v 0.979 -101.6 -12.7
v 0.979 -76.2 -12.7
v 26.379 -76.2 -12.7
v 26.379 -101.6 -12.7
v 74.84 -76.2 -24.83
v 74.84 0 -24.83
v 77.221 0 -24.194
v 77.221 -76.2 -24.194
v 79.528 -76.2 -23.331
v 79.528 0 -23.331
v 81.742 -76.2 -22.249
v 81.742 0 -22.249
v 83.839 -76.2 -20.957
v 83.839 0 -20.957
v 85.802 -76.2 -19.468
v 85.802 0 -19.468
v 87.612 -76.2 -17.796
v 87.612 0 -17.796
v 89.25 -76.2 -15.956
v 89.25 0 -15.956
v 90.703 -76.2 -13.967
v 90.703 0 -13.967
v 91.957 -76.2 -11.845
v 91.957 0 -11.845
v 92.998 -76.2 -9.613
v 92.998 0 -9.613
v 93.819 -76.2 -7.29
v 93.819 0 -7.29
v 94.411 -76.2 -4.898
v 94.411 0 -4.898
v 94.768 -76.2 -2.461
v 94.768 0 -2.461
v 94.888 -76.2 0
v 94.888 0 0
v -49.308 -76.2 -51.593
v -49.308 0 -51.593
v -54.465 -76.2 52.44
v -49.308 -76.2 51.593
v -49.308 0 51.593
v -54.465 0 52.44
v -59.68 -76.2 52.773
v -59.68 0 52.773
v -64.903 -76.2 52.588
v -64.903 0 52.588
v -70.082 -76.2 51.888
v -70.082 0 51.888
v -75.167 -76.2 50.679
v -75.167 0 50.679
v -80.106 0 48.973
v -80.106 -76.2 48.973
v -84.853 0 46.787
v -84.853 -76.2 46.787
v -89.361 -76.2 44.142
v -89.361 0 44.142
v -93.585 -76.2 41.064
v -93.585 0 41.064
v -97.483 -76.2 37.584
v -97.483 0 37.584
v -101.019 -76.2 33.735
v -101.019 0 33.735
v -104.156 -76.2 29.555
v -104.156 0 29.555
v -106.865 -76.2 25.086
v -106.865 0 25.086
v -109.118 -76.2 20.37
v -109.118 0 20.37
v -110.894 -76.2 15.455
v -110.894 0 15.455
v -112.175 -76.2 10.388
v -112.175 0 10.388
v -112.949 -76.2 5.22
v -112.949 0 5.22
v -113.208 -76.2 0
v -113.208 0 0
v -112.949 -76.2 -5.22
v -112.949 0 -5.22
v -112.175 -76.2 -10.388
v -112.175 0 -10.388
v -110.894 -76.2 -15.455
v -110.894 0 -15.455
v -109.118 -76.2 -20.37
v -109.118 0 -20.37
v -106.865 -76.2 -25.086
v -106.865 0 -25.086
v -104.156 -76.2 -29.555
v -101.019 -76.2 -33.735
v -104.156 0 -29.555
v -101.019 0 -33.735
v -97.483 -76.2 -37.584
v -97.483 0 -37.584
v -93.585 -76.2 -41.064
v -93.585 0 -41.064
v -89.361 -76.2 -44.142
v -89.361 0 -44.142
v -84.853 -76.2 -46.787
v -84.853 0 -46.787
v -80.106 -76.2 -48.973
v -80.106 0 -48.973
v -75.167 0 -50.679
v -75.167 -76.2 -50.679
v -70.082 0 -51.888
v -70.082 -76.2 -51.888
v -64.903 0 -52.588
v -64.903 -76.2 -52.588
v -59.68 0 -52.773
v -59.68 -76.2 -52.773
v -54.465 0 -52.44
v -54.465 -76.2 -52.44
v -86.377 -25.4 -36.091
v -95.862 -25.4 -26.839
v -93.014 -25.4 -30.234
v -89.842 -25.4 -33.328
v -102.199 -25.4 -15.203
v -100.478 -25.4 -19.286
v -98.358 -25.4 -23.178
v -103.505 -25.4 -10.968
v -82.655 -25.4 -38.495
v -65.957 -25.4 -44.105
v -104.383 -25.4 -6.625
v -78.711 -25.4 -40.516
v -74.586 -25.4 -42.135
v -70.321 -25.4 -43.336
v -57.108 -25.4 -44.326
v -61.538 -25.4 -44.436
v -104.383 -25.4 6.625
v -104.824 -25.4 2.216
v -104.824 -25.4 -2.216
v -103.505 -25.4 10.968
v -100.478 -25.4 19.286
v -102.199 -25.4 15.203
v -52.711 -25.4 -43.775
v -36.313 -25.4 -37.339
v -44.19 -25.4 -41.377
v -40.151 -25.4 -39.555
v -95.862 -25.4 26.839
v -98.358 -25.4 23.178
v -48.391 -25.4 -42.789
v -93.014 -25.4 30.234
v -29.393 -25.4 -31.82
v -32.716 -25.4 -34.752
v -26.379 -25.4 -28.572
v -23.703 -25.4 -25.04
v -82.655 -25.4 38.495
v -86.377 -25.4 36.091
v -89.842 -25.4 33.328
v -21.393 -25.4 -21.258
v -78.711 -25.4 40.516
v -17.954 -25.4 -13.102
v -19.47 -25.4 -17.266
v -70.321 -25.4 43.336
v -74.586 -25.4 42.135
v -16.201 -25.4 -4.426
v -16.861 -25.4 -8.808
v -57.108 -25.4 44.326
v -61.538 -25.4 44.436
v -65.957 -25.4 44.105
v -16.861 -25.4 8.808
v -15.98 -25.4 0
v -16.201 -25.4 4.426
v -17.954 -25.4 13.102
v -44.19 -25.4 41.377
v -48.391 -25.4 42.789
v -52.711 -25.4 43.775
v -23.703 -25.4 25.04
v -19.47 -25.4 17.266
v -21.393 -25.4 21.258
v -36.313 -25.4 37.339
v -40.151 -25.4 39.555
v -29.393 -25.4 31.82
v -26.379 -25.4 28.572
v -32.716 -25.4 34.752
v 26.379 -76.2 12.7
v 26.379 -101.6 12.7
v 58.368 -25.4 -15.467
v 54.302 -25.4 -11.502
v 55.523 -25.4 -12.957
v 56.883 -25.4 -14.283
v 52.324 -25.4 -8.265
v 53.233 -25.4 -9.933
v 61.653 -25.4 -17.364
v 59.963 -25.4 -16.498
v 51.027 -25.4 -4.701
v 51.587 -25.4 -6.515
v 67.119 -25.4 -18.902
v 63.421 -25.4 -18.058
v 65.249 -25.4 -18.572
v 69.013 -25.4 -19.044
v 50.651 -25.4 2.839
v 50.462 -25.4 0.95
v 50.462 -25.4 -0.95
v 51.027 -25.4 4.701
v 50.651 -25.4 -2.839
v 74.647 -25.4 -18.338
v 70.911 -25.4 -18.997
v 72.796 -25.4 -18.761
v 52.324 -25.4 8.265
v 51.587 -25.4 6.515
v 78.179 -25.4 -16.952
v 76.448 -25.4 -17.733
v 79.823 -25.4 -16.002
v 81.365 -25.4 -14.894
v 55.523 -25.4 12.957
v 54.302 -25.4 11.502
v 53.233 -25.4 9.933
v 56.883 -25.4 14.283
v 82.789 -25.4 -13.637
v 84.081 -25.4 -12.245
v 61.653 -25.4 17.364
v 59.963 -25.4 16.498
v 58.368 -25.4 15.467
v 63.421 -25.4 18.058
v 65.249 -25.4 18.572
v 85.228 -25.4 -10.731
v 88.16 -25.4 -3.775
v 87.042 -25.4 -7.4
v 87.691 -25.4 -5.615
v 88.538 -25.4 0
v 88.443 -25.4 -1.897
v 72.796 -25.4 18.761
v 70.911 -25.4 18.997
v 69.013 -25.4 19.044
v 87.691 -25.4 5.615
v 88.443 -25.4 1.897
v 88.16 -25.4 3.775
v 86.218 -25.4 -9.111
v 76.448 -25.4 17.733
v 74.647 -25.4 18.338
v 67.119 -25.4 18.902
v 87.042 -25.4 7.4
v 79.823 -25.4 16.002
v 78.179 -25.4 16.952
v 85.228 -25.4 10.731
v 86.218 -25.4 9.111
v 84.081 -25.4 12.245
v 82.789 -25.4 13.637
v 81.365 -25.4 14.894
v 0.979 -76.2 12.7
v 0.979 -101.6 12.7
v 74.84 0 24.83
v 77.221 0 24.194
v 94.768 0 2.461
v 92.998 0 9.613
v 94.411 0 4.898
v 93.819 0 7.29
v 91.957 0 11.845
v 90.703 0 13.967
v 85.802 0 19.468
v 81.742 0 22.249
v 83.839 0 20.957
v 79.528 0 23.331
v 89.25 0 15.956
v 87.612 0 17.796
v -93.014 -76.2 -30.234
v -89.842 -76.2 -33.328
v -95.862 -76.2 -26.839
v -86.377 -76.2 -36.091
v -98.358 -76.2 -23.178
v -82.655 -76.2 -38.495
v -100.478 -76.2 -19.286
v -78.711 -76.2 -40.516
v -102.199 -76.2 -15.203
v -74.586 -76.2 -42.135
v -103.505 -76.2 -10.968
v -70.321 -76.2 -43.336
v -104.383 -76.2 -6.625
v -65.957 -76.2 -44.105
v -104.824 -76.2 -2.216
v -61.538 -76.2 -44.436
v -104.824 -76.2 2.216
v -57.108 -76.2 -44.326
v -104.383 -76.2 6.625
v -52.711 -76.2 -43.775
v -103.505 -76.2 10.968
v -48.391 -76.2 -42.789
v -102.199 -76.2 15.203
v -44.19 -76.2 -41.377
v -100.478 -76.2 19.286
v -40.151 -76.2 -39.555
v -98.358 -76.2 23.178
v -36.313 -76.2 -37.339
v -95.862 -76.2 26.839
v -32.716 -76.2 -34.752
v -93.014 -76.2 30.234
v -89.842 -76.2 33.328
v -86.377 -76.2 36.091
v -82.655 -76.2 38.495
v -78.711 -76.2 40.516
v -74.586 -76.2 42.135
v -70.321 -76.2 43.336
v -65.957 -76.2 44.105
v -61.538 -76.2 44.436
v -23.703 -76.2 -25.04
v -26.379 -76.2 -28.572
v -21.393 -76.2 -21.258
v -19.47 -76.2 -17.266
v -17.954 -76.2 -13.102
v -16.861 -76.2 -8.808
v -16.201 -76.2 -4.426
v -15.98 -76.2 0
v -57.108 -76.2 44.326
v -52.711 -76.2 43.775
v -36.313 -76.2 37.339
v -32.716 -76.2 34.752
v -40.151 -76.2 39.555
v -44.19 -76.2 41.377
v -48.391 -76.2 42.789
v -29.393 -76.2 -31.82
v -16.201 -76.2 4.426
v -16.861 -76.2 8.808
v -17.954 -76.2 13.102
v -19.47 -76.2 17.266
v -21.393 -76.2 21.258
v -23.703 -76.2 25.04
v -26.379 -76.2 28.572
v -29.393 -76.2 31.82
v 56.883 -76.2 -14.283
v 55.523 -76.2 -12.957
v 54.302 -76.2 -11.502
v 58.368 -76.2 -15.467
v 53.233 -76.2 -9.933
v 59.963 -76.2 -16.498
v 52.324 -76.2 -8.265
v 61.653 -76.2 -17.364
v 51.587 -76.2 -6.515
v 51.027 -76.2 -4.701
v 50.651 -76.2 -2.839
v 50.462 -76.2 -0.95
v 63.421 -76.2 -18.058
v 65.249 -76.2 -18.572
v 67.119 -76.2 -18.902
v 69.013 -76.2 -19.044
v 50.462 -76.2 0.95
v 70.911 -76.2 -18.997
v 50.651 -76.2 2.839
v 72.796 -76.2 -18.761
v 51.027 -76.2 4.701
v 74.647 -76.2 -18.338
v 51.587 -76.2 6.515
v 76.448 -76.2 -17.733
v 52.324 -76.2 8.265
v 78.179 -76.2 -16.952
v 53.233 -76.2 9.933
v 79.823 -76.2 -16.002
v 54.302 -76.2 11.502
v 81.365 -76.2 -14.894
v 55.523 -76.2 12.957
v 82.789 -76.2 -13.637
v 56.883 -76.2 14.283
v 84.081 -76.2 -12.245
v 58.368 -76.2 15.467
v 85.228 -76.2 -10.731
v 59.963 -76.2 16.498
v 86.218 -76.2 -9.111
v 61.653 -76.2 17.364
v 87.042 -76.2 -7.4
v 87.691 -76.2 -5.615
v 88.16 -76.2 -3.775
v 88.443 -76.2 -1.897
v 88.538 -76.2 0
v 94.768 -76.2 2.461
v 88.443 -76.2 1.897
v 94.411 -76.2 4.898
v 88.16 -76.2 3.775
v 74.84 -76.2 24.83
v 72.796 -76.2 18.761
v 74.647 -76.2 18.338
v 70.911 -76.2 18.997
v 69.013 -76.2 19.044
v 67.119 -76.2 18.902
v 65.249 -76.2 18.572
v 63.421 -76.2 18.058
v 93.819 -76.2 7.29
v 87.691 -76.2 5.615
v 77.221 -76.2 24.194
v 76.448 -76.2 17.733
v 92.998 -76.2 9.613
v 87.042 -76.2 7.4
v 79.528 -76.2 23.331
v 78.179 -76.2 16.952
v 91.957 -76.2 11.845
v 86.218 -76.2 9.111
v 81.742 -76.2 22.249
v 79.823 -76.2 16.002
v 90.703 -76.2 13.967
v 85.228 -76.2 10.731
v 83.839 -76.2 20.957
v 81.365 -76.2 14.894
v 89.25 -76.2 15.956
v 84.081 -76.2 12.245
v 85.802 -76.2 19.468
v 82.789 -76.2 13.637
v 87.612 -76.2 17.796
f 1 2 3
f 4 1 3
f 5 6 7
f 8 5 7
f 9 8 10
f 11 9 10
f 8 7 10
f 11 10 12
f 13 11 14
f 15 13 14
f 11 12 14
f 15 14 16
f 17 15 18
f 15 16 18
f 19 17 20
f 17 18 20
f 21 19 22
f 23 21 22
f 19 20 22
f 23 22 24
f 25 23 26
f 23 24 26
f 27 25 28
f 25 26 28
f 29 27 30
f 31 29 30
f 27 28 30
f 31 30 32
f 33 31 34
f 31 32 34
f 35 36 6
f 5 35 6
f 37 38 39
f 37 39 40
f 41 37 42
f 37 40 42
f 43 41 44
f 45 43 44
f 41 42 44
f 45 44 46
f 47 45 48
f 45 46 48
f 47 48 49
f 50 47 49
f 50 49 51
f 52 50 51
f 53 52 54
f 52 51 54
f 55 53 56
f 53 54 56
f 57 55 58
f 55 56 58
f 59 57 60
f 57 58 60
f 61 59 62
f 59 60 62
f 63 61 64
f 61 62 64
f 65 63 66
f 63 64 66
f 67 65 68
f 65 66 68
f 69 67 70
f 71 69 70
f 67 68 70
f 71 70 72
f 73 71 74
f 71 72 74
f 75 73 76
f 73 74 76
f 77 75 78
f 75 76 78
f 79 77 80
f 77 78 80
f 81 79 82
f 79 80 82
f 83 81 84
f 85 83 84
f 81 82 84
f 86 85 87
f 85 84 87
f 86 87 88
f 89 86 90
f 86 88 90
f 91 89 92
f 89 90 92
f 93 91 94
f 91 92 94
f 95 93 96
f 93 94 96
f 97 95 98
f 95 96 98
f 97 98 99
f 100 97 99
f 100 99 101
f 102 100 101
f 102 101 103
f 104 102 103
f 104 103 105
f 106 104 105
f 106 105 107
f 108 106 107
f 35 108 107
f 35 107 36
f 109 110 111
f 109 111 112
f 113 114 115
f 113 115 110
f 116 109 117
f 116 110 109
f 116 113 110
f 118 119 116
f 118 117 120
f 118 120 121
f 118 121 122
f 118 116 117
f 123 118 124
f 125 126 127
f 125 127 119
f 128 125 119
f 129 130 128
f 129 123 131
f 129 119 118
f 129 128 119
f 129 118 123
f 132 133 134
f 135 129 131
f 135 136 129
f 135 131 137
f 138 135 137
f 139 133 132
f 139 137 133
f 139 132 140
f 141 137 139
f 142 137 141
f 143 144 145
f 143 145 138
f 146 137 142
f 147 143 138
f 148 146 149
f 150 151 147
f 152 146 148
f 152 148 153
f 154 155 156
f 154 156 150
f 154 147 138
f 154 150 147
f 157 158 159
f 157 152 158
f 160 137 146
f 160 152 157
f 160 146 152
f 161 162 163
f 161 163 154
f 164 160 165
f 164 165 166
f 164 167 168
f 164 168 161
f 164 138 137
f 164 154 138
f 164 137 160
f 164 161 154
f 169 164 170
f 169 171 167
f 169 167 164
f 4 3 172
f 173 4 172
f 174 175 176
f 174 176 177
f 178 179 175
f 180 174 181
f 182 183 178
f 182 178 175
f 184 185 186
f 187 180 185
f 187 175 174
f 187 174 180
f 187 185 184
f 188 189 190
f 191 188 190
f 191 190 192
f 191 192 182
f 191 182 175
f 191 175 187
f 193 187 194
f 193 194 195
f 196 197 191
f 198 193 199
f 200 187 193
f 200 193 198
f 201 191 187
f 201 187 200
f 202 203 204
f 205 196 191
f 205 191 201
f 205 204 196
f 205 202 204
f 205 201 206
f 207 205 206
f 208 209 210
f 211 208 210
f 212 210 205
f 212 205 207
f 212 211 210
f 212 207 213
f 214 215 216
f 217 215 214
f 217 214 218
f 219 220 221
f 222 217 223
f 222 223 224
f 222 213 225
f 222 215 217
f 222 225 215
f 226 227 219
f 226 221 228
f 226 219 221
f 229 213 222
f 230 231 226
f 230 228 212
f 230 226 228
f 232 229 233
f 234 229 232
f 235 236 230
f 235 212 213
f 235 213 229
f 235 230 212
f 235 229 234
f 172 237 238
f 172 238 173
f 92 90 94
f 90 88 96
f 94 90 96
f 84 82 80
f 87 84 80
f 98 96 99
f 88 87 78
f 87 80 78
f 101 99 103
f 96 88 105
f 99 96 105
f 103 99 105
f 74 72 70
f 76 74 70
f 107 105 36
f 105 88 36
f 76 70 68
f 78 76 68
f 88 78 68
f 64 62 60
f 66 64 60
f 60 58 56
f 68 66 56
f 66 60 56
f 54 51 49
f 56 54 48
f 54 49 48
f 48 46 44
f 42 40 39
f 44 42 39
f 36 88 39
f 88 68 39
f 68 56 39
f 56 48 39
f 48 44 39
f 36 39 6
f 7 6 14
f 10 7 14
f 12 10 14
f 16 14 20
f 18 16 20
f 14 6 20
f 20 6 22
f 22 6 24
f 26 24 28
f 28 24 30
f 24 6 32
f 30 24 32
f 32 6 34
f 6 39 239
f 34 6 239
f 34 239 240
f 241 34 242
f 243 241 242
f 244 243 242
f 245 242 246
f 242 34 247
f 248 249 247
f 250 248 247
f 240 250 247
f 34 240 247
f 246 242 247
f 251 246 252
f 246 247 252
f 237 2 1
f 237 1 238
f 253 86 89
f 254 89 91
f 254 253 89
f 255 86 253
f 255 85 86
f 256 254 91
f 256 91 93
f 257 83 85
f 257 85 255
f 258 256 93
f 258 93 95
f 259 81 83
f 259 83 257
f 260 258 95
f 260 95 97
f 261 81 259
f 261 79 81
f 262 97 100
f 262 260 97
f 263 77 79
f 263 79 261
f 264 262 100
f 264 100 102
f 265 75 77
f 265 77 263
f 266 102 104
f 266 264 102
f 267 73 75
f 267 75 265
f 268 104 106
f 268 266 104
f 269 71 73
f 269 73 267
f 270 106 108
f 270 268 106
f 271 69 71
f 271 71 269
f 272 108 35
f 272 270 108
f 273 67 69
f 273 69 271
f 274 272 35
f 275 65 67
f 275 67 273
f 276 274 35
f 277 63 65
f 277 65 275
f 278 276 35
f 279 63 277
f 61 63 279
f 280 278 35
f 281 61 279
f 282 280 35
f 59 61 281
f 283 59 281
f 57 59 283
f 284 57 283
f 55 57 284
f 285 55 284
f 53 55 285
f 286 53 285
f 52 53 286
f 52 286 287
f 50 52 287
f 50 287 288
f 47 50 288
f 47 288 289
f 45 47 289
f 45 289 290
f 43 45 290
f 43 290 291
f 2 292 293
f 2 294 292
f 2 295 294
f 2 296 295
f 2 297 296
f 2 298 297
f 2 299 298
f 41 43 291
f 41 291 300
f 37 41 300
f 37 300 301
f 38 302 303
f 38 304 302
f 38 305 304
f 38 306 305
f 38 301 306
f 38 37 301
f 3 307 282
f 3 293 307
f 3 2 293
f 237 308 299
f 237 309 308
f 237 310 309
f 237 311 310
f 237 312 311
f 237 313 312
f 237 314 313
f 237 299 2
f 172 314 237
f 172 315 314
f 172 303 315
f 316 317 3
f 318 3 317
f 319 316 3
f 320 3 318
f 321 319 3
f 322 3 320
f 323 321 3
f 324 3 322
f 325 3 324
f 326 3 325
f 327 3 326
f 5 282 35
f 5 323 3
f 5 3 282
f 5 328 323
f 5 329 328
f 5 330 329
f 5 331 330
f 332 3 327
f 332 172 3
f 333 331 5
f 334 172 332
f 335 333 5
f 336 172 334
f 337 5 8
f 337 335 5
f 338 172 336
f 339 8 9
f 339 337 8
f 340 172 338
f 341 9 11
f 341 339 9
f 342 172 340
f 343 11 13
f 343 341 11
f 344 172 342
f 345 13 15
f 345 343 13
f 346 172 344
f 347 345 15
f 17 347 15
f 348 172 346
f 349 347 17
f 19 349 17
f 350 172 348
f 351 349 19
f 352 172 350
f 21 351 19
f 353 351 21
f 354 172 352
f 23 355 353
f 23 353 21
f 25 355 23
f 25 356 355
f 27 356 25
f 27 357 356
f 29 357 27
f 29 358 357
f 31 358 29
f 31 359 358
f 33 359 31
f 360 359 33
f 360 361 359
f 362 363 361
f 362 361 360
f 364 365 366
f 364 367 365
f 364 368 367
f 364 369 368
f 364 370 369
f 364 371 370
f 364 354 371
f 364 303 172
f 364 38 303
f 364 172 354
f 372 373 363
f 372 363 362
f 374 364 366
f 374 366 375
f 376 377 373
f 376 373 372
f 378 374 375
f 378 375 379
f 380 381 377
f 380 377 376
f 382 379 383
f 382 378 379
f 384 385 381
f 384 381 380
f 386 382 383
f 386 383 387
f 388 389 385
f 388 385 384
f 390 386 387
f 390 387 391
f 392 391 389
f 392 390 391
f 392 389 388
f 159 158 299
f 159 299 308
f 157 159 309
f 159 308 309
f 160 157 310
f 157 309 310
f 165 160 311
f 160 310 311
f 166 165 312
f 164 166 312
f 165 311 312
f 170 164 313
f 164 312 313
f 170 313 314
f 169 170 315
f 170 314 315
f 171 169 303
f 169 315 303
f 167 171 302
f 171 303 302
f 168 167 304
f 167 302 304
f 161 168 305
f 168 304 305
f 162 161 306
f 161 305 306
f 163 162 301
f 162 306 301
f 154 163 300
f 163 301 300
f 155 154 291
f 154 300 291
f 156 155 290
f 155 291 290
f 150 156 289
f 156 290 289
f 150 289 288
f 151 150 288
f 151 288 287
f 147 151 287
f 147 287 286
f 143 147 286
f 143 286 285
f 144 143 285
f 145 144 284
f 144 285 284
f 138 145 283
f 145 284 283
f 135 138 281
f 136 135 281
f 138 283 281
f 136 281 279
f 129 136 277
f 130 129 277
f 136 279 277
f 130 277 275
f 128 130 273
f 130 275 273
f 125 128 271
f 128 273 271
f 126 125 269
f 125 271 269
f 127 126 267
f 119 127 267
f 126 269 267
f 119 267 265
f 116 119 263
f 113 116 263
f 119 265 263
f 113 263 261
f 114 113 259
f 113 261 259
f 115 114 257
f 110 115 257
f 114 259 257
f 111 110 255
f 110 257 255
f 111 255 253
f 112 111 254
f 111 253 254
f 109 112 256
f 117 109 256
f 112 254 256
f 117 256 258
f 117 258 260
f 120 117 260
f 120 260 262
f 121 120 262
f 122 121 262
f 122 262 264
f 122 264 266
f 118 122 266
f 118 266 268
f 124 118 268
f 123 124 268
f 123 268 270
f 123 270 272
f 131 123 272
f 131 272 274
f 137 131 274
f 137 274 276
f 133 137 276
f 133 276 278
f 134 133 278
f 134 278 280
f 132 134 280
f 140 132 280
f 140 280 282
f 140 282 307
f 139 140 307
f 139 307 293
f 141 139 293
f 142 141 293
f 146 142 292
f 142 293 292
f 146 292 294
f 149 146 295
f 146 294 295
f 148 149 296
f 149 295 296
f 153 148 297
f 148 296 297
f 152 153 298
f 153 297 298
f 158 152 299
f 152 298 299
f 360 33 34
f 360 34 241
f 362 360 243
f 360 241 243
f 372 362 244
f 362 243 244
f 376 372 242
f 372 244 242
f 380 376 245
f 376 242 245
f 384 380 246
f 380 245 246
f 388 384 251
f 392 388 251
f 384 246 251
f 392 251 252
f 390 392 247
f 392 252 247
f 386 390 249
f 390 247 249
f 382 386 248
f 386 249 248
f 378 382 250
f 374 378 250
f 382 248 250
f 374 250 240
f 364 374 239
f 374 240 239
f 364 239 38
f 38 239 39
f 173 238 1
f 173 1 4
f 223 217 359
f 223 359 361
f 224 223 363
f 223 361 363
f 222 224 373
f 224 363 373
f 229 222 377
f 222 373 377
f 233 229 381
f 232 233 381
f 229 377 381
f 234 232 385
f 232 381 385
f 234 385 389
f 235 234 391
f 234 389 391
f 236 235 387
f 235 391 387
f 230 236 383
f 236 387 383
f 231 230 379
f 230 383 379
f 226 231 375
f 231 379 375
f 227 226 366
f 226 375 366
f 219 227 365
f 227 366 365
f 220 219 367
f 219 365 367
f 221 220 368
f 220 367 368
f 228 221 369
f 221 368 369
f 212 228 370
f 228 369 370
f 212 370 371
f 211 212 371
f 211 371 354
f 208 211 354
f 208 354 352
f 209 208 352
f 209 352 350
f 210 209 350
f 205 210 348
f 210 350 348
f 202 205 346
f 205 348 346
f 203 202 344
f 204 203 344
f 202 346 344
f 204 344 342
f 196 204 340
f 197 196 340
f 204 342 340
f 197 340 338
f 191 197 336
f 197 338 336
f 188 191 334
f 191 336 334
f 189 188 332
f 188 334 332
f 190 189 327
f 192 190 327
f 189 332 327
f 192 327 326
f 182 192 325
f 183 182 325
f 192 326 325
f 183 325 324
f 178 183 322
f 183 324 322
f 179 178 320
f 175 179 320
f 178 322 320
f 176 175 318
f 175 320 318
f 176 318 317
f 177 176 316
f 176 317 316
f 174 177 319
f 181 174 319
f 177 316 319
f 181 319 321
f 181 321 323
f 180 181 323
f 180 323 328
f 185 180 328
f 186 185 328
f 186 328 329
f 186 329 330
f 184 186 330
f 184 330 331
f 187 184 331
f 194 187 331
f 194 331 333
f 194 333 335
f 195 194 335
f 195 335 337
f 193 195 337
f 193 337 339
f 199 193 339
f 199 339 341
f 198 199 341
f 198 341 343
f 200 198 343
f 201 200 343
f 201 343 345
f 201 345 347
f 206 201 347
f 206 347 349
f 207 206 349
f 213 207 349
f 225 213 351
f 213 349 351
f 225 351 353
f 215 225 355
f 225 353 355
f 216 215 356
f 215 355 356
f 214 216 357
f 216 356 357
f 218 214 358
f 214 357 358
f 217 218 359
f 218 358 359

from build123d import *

# Parameters (mm, degrees)
F1_DEPTH = 76.2
F2_R     = 44.45
F3_DEPTH = 50.8
F4_R     = 19.05
F5_DEPTH = 50.8
F6_W     = 25.4
F6_H     = 25.4
F7_DEPTH = 25.4


with BuildPart() as f1:
    # F0 (on Front) → F1 (new body)
    with BuildSketch(Plane.XZ):
        with BuildLine():
            ThreePointArc((-49.307566, -51.592763), (-19.365586, -33.155036), (-7.651684, 0))
            ThreePointArc((-7.651684, 0), (-19.365586, 33.155036), (-49.307566, 51.592763))
            ThreePointArc((-49.307566, 51.592763), (-113.207623, 0), (-49.307566, -51.592763))
        make_face()
        with BuildLine():
            ThreePointArc((-49.307566, 51.592763), (-19.365586, 33.155036), (-7.651684, 0))
            ThreePointArc((-7.651684, 0), (-19.365586, -33.155036), (-49.307566, -51.592763))
            Line((-49.307566, -51.592763), (74.840464, -24.829606))
            ThreePointArc((74.840464, -24.829606), (44.087832, 0), (74.840464, 24.829606))
            Line((74.840464, 24.829606), (-49.307566, 51.592763))
        make_face()
        with BuildLine():
            ThreePointArc((94.887832, 0), (89.250383, 15.95624), (74.840464, 24.829606))
            ThreePointArc((74.840464, 24.829606), (44.087832, 0), (74.840464, -24.829606))
            ThreePointArc((74.840464, -24.829606), (89.250383, -15.95624), (94.887832, 0))
        make_face()
    extrude(amount=F1_DEPTH)

    # F2 (on face) → F3 (cut)
    with BuildSketch(Plane.XZ.offset(76.2)):
        with Locations((-60.429654, 0)):
            Circle(F2_R)
    extrude(amount=-F3_DEPTH, mode=Mode.SUBTRACT)

    # F4 (on face) → F5 (cut)
    with BuildSketch(Plane.XZ.offset(76.2)):
        with Locations((69.487832, 0)):
            Circle(F4_R)
    extrude(amount=-F5_DEPTH, mode=Mode.SUBTRACT)

    # F6 (on face) → F7 (join)
    with BuildSketch(Plane.XZ.offset(76.2)):
        with Locations((13.679137, 0)):
            Rectangle(F6_W, F6_H)
    extrude(amount=F7_DEPTH)


solid = f1.part
